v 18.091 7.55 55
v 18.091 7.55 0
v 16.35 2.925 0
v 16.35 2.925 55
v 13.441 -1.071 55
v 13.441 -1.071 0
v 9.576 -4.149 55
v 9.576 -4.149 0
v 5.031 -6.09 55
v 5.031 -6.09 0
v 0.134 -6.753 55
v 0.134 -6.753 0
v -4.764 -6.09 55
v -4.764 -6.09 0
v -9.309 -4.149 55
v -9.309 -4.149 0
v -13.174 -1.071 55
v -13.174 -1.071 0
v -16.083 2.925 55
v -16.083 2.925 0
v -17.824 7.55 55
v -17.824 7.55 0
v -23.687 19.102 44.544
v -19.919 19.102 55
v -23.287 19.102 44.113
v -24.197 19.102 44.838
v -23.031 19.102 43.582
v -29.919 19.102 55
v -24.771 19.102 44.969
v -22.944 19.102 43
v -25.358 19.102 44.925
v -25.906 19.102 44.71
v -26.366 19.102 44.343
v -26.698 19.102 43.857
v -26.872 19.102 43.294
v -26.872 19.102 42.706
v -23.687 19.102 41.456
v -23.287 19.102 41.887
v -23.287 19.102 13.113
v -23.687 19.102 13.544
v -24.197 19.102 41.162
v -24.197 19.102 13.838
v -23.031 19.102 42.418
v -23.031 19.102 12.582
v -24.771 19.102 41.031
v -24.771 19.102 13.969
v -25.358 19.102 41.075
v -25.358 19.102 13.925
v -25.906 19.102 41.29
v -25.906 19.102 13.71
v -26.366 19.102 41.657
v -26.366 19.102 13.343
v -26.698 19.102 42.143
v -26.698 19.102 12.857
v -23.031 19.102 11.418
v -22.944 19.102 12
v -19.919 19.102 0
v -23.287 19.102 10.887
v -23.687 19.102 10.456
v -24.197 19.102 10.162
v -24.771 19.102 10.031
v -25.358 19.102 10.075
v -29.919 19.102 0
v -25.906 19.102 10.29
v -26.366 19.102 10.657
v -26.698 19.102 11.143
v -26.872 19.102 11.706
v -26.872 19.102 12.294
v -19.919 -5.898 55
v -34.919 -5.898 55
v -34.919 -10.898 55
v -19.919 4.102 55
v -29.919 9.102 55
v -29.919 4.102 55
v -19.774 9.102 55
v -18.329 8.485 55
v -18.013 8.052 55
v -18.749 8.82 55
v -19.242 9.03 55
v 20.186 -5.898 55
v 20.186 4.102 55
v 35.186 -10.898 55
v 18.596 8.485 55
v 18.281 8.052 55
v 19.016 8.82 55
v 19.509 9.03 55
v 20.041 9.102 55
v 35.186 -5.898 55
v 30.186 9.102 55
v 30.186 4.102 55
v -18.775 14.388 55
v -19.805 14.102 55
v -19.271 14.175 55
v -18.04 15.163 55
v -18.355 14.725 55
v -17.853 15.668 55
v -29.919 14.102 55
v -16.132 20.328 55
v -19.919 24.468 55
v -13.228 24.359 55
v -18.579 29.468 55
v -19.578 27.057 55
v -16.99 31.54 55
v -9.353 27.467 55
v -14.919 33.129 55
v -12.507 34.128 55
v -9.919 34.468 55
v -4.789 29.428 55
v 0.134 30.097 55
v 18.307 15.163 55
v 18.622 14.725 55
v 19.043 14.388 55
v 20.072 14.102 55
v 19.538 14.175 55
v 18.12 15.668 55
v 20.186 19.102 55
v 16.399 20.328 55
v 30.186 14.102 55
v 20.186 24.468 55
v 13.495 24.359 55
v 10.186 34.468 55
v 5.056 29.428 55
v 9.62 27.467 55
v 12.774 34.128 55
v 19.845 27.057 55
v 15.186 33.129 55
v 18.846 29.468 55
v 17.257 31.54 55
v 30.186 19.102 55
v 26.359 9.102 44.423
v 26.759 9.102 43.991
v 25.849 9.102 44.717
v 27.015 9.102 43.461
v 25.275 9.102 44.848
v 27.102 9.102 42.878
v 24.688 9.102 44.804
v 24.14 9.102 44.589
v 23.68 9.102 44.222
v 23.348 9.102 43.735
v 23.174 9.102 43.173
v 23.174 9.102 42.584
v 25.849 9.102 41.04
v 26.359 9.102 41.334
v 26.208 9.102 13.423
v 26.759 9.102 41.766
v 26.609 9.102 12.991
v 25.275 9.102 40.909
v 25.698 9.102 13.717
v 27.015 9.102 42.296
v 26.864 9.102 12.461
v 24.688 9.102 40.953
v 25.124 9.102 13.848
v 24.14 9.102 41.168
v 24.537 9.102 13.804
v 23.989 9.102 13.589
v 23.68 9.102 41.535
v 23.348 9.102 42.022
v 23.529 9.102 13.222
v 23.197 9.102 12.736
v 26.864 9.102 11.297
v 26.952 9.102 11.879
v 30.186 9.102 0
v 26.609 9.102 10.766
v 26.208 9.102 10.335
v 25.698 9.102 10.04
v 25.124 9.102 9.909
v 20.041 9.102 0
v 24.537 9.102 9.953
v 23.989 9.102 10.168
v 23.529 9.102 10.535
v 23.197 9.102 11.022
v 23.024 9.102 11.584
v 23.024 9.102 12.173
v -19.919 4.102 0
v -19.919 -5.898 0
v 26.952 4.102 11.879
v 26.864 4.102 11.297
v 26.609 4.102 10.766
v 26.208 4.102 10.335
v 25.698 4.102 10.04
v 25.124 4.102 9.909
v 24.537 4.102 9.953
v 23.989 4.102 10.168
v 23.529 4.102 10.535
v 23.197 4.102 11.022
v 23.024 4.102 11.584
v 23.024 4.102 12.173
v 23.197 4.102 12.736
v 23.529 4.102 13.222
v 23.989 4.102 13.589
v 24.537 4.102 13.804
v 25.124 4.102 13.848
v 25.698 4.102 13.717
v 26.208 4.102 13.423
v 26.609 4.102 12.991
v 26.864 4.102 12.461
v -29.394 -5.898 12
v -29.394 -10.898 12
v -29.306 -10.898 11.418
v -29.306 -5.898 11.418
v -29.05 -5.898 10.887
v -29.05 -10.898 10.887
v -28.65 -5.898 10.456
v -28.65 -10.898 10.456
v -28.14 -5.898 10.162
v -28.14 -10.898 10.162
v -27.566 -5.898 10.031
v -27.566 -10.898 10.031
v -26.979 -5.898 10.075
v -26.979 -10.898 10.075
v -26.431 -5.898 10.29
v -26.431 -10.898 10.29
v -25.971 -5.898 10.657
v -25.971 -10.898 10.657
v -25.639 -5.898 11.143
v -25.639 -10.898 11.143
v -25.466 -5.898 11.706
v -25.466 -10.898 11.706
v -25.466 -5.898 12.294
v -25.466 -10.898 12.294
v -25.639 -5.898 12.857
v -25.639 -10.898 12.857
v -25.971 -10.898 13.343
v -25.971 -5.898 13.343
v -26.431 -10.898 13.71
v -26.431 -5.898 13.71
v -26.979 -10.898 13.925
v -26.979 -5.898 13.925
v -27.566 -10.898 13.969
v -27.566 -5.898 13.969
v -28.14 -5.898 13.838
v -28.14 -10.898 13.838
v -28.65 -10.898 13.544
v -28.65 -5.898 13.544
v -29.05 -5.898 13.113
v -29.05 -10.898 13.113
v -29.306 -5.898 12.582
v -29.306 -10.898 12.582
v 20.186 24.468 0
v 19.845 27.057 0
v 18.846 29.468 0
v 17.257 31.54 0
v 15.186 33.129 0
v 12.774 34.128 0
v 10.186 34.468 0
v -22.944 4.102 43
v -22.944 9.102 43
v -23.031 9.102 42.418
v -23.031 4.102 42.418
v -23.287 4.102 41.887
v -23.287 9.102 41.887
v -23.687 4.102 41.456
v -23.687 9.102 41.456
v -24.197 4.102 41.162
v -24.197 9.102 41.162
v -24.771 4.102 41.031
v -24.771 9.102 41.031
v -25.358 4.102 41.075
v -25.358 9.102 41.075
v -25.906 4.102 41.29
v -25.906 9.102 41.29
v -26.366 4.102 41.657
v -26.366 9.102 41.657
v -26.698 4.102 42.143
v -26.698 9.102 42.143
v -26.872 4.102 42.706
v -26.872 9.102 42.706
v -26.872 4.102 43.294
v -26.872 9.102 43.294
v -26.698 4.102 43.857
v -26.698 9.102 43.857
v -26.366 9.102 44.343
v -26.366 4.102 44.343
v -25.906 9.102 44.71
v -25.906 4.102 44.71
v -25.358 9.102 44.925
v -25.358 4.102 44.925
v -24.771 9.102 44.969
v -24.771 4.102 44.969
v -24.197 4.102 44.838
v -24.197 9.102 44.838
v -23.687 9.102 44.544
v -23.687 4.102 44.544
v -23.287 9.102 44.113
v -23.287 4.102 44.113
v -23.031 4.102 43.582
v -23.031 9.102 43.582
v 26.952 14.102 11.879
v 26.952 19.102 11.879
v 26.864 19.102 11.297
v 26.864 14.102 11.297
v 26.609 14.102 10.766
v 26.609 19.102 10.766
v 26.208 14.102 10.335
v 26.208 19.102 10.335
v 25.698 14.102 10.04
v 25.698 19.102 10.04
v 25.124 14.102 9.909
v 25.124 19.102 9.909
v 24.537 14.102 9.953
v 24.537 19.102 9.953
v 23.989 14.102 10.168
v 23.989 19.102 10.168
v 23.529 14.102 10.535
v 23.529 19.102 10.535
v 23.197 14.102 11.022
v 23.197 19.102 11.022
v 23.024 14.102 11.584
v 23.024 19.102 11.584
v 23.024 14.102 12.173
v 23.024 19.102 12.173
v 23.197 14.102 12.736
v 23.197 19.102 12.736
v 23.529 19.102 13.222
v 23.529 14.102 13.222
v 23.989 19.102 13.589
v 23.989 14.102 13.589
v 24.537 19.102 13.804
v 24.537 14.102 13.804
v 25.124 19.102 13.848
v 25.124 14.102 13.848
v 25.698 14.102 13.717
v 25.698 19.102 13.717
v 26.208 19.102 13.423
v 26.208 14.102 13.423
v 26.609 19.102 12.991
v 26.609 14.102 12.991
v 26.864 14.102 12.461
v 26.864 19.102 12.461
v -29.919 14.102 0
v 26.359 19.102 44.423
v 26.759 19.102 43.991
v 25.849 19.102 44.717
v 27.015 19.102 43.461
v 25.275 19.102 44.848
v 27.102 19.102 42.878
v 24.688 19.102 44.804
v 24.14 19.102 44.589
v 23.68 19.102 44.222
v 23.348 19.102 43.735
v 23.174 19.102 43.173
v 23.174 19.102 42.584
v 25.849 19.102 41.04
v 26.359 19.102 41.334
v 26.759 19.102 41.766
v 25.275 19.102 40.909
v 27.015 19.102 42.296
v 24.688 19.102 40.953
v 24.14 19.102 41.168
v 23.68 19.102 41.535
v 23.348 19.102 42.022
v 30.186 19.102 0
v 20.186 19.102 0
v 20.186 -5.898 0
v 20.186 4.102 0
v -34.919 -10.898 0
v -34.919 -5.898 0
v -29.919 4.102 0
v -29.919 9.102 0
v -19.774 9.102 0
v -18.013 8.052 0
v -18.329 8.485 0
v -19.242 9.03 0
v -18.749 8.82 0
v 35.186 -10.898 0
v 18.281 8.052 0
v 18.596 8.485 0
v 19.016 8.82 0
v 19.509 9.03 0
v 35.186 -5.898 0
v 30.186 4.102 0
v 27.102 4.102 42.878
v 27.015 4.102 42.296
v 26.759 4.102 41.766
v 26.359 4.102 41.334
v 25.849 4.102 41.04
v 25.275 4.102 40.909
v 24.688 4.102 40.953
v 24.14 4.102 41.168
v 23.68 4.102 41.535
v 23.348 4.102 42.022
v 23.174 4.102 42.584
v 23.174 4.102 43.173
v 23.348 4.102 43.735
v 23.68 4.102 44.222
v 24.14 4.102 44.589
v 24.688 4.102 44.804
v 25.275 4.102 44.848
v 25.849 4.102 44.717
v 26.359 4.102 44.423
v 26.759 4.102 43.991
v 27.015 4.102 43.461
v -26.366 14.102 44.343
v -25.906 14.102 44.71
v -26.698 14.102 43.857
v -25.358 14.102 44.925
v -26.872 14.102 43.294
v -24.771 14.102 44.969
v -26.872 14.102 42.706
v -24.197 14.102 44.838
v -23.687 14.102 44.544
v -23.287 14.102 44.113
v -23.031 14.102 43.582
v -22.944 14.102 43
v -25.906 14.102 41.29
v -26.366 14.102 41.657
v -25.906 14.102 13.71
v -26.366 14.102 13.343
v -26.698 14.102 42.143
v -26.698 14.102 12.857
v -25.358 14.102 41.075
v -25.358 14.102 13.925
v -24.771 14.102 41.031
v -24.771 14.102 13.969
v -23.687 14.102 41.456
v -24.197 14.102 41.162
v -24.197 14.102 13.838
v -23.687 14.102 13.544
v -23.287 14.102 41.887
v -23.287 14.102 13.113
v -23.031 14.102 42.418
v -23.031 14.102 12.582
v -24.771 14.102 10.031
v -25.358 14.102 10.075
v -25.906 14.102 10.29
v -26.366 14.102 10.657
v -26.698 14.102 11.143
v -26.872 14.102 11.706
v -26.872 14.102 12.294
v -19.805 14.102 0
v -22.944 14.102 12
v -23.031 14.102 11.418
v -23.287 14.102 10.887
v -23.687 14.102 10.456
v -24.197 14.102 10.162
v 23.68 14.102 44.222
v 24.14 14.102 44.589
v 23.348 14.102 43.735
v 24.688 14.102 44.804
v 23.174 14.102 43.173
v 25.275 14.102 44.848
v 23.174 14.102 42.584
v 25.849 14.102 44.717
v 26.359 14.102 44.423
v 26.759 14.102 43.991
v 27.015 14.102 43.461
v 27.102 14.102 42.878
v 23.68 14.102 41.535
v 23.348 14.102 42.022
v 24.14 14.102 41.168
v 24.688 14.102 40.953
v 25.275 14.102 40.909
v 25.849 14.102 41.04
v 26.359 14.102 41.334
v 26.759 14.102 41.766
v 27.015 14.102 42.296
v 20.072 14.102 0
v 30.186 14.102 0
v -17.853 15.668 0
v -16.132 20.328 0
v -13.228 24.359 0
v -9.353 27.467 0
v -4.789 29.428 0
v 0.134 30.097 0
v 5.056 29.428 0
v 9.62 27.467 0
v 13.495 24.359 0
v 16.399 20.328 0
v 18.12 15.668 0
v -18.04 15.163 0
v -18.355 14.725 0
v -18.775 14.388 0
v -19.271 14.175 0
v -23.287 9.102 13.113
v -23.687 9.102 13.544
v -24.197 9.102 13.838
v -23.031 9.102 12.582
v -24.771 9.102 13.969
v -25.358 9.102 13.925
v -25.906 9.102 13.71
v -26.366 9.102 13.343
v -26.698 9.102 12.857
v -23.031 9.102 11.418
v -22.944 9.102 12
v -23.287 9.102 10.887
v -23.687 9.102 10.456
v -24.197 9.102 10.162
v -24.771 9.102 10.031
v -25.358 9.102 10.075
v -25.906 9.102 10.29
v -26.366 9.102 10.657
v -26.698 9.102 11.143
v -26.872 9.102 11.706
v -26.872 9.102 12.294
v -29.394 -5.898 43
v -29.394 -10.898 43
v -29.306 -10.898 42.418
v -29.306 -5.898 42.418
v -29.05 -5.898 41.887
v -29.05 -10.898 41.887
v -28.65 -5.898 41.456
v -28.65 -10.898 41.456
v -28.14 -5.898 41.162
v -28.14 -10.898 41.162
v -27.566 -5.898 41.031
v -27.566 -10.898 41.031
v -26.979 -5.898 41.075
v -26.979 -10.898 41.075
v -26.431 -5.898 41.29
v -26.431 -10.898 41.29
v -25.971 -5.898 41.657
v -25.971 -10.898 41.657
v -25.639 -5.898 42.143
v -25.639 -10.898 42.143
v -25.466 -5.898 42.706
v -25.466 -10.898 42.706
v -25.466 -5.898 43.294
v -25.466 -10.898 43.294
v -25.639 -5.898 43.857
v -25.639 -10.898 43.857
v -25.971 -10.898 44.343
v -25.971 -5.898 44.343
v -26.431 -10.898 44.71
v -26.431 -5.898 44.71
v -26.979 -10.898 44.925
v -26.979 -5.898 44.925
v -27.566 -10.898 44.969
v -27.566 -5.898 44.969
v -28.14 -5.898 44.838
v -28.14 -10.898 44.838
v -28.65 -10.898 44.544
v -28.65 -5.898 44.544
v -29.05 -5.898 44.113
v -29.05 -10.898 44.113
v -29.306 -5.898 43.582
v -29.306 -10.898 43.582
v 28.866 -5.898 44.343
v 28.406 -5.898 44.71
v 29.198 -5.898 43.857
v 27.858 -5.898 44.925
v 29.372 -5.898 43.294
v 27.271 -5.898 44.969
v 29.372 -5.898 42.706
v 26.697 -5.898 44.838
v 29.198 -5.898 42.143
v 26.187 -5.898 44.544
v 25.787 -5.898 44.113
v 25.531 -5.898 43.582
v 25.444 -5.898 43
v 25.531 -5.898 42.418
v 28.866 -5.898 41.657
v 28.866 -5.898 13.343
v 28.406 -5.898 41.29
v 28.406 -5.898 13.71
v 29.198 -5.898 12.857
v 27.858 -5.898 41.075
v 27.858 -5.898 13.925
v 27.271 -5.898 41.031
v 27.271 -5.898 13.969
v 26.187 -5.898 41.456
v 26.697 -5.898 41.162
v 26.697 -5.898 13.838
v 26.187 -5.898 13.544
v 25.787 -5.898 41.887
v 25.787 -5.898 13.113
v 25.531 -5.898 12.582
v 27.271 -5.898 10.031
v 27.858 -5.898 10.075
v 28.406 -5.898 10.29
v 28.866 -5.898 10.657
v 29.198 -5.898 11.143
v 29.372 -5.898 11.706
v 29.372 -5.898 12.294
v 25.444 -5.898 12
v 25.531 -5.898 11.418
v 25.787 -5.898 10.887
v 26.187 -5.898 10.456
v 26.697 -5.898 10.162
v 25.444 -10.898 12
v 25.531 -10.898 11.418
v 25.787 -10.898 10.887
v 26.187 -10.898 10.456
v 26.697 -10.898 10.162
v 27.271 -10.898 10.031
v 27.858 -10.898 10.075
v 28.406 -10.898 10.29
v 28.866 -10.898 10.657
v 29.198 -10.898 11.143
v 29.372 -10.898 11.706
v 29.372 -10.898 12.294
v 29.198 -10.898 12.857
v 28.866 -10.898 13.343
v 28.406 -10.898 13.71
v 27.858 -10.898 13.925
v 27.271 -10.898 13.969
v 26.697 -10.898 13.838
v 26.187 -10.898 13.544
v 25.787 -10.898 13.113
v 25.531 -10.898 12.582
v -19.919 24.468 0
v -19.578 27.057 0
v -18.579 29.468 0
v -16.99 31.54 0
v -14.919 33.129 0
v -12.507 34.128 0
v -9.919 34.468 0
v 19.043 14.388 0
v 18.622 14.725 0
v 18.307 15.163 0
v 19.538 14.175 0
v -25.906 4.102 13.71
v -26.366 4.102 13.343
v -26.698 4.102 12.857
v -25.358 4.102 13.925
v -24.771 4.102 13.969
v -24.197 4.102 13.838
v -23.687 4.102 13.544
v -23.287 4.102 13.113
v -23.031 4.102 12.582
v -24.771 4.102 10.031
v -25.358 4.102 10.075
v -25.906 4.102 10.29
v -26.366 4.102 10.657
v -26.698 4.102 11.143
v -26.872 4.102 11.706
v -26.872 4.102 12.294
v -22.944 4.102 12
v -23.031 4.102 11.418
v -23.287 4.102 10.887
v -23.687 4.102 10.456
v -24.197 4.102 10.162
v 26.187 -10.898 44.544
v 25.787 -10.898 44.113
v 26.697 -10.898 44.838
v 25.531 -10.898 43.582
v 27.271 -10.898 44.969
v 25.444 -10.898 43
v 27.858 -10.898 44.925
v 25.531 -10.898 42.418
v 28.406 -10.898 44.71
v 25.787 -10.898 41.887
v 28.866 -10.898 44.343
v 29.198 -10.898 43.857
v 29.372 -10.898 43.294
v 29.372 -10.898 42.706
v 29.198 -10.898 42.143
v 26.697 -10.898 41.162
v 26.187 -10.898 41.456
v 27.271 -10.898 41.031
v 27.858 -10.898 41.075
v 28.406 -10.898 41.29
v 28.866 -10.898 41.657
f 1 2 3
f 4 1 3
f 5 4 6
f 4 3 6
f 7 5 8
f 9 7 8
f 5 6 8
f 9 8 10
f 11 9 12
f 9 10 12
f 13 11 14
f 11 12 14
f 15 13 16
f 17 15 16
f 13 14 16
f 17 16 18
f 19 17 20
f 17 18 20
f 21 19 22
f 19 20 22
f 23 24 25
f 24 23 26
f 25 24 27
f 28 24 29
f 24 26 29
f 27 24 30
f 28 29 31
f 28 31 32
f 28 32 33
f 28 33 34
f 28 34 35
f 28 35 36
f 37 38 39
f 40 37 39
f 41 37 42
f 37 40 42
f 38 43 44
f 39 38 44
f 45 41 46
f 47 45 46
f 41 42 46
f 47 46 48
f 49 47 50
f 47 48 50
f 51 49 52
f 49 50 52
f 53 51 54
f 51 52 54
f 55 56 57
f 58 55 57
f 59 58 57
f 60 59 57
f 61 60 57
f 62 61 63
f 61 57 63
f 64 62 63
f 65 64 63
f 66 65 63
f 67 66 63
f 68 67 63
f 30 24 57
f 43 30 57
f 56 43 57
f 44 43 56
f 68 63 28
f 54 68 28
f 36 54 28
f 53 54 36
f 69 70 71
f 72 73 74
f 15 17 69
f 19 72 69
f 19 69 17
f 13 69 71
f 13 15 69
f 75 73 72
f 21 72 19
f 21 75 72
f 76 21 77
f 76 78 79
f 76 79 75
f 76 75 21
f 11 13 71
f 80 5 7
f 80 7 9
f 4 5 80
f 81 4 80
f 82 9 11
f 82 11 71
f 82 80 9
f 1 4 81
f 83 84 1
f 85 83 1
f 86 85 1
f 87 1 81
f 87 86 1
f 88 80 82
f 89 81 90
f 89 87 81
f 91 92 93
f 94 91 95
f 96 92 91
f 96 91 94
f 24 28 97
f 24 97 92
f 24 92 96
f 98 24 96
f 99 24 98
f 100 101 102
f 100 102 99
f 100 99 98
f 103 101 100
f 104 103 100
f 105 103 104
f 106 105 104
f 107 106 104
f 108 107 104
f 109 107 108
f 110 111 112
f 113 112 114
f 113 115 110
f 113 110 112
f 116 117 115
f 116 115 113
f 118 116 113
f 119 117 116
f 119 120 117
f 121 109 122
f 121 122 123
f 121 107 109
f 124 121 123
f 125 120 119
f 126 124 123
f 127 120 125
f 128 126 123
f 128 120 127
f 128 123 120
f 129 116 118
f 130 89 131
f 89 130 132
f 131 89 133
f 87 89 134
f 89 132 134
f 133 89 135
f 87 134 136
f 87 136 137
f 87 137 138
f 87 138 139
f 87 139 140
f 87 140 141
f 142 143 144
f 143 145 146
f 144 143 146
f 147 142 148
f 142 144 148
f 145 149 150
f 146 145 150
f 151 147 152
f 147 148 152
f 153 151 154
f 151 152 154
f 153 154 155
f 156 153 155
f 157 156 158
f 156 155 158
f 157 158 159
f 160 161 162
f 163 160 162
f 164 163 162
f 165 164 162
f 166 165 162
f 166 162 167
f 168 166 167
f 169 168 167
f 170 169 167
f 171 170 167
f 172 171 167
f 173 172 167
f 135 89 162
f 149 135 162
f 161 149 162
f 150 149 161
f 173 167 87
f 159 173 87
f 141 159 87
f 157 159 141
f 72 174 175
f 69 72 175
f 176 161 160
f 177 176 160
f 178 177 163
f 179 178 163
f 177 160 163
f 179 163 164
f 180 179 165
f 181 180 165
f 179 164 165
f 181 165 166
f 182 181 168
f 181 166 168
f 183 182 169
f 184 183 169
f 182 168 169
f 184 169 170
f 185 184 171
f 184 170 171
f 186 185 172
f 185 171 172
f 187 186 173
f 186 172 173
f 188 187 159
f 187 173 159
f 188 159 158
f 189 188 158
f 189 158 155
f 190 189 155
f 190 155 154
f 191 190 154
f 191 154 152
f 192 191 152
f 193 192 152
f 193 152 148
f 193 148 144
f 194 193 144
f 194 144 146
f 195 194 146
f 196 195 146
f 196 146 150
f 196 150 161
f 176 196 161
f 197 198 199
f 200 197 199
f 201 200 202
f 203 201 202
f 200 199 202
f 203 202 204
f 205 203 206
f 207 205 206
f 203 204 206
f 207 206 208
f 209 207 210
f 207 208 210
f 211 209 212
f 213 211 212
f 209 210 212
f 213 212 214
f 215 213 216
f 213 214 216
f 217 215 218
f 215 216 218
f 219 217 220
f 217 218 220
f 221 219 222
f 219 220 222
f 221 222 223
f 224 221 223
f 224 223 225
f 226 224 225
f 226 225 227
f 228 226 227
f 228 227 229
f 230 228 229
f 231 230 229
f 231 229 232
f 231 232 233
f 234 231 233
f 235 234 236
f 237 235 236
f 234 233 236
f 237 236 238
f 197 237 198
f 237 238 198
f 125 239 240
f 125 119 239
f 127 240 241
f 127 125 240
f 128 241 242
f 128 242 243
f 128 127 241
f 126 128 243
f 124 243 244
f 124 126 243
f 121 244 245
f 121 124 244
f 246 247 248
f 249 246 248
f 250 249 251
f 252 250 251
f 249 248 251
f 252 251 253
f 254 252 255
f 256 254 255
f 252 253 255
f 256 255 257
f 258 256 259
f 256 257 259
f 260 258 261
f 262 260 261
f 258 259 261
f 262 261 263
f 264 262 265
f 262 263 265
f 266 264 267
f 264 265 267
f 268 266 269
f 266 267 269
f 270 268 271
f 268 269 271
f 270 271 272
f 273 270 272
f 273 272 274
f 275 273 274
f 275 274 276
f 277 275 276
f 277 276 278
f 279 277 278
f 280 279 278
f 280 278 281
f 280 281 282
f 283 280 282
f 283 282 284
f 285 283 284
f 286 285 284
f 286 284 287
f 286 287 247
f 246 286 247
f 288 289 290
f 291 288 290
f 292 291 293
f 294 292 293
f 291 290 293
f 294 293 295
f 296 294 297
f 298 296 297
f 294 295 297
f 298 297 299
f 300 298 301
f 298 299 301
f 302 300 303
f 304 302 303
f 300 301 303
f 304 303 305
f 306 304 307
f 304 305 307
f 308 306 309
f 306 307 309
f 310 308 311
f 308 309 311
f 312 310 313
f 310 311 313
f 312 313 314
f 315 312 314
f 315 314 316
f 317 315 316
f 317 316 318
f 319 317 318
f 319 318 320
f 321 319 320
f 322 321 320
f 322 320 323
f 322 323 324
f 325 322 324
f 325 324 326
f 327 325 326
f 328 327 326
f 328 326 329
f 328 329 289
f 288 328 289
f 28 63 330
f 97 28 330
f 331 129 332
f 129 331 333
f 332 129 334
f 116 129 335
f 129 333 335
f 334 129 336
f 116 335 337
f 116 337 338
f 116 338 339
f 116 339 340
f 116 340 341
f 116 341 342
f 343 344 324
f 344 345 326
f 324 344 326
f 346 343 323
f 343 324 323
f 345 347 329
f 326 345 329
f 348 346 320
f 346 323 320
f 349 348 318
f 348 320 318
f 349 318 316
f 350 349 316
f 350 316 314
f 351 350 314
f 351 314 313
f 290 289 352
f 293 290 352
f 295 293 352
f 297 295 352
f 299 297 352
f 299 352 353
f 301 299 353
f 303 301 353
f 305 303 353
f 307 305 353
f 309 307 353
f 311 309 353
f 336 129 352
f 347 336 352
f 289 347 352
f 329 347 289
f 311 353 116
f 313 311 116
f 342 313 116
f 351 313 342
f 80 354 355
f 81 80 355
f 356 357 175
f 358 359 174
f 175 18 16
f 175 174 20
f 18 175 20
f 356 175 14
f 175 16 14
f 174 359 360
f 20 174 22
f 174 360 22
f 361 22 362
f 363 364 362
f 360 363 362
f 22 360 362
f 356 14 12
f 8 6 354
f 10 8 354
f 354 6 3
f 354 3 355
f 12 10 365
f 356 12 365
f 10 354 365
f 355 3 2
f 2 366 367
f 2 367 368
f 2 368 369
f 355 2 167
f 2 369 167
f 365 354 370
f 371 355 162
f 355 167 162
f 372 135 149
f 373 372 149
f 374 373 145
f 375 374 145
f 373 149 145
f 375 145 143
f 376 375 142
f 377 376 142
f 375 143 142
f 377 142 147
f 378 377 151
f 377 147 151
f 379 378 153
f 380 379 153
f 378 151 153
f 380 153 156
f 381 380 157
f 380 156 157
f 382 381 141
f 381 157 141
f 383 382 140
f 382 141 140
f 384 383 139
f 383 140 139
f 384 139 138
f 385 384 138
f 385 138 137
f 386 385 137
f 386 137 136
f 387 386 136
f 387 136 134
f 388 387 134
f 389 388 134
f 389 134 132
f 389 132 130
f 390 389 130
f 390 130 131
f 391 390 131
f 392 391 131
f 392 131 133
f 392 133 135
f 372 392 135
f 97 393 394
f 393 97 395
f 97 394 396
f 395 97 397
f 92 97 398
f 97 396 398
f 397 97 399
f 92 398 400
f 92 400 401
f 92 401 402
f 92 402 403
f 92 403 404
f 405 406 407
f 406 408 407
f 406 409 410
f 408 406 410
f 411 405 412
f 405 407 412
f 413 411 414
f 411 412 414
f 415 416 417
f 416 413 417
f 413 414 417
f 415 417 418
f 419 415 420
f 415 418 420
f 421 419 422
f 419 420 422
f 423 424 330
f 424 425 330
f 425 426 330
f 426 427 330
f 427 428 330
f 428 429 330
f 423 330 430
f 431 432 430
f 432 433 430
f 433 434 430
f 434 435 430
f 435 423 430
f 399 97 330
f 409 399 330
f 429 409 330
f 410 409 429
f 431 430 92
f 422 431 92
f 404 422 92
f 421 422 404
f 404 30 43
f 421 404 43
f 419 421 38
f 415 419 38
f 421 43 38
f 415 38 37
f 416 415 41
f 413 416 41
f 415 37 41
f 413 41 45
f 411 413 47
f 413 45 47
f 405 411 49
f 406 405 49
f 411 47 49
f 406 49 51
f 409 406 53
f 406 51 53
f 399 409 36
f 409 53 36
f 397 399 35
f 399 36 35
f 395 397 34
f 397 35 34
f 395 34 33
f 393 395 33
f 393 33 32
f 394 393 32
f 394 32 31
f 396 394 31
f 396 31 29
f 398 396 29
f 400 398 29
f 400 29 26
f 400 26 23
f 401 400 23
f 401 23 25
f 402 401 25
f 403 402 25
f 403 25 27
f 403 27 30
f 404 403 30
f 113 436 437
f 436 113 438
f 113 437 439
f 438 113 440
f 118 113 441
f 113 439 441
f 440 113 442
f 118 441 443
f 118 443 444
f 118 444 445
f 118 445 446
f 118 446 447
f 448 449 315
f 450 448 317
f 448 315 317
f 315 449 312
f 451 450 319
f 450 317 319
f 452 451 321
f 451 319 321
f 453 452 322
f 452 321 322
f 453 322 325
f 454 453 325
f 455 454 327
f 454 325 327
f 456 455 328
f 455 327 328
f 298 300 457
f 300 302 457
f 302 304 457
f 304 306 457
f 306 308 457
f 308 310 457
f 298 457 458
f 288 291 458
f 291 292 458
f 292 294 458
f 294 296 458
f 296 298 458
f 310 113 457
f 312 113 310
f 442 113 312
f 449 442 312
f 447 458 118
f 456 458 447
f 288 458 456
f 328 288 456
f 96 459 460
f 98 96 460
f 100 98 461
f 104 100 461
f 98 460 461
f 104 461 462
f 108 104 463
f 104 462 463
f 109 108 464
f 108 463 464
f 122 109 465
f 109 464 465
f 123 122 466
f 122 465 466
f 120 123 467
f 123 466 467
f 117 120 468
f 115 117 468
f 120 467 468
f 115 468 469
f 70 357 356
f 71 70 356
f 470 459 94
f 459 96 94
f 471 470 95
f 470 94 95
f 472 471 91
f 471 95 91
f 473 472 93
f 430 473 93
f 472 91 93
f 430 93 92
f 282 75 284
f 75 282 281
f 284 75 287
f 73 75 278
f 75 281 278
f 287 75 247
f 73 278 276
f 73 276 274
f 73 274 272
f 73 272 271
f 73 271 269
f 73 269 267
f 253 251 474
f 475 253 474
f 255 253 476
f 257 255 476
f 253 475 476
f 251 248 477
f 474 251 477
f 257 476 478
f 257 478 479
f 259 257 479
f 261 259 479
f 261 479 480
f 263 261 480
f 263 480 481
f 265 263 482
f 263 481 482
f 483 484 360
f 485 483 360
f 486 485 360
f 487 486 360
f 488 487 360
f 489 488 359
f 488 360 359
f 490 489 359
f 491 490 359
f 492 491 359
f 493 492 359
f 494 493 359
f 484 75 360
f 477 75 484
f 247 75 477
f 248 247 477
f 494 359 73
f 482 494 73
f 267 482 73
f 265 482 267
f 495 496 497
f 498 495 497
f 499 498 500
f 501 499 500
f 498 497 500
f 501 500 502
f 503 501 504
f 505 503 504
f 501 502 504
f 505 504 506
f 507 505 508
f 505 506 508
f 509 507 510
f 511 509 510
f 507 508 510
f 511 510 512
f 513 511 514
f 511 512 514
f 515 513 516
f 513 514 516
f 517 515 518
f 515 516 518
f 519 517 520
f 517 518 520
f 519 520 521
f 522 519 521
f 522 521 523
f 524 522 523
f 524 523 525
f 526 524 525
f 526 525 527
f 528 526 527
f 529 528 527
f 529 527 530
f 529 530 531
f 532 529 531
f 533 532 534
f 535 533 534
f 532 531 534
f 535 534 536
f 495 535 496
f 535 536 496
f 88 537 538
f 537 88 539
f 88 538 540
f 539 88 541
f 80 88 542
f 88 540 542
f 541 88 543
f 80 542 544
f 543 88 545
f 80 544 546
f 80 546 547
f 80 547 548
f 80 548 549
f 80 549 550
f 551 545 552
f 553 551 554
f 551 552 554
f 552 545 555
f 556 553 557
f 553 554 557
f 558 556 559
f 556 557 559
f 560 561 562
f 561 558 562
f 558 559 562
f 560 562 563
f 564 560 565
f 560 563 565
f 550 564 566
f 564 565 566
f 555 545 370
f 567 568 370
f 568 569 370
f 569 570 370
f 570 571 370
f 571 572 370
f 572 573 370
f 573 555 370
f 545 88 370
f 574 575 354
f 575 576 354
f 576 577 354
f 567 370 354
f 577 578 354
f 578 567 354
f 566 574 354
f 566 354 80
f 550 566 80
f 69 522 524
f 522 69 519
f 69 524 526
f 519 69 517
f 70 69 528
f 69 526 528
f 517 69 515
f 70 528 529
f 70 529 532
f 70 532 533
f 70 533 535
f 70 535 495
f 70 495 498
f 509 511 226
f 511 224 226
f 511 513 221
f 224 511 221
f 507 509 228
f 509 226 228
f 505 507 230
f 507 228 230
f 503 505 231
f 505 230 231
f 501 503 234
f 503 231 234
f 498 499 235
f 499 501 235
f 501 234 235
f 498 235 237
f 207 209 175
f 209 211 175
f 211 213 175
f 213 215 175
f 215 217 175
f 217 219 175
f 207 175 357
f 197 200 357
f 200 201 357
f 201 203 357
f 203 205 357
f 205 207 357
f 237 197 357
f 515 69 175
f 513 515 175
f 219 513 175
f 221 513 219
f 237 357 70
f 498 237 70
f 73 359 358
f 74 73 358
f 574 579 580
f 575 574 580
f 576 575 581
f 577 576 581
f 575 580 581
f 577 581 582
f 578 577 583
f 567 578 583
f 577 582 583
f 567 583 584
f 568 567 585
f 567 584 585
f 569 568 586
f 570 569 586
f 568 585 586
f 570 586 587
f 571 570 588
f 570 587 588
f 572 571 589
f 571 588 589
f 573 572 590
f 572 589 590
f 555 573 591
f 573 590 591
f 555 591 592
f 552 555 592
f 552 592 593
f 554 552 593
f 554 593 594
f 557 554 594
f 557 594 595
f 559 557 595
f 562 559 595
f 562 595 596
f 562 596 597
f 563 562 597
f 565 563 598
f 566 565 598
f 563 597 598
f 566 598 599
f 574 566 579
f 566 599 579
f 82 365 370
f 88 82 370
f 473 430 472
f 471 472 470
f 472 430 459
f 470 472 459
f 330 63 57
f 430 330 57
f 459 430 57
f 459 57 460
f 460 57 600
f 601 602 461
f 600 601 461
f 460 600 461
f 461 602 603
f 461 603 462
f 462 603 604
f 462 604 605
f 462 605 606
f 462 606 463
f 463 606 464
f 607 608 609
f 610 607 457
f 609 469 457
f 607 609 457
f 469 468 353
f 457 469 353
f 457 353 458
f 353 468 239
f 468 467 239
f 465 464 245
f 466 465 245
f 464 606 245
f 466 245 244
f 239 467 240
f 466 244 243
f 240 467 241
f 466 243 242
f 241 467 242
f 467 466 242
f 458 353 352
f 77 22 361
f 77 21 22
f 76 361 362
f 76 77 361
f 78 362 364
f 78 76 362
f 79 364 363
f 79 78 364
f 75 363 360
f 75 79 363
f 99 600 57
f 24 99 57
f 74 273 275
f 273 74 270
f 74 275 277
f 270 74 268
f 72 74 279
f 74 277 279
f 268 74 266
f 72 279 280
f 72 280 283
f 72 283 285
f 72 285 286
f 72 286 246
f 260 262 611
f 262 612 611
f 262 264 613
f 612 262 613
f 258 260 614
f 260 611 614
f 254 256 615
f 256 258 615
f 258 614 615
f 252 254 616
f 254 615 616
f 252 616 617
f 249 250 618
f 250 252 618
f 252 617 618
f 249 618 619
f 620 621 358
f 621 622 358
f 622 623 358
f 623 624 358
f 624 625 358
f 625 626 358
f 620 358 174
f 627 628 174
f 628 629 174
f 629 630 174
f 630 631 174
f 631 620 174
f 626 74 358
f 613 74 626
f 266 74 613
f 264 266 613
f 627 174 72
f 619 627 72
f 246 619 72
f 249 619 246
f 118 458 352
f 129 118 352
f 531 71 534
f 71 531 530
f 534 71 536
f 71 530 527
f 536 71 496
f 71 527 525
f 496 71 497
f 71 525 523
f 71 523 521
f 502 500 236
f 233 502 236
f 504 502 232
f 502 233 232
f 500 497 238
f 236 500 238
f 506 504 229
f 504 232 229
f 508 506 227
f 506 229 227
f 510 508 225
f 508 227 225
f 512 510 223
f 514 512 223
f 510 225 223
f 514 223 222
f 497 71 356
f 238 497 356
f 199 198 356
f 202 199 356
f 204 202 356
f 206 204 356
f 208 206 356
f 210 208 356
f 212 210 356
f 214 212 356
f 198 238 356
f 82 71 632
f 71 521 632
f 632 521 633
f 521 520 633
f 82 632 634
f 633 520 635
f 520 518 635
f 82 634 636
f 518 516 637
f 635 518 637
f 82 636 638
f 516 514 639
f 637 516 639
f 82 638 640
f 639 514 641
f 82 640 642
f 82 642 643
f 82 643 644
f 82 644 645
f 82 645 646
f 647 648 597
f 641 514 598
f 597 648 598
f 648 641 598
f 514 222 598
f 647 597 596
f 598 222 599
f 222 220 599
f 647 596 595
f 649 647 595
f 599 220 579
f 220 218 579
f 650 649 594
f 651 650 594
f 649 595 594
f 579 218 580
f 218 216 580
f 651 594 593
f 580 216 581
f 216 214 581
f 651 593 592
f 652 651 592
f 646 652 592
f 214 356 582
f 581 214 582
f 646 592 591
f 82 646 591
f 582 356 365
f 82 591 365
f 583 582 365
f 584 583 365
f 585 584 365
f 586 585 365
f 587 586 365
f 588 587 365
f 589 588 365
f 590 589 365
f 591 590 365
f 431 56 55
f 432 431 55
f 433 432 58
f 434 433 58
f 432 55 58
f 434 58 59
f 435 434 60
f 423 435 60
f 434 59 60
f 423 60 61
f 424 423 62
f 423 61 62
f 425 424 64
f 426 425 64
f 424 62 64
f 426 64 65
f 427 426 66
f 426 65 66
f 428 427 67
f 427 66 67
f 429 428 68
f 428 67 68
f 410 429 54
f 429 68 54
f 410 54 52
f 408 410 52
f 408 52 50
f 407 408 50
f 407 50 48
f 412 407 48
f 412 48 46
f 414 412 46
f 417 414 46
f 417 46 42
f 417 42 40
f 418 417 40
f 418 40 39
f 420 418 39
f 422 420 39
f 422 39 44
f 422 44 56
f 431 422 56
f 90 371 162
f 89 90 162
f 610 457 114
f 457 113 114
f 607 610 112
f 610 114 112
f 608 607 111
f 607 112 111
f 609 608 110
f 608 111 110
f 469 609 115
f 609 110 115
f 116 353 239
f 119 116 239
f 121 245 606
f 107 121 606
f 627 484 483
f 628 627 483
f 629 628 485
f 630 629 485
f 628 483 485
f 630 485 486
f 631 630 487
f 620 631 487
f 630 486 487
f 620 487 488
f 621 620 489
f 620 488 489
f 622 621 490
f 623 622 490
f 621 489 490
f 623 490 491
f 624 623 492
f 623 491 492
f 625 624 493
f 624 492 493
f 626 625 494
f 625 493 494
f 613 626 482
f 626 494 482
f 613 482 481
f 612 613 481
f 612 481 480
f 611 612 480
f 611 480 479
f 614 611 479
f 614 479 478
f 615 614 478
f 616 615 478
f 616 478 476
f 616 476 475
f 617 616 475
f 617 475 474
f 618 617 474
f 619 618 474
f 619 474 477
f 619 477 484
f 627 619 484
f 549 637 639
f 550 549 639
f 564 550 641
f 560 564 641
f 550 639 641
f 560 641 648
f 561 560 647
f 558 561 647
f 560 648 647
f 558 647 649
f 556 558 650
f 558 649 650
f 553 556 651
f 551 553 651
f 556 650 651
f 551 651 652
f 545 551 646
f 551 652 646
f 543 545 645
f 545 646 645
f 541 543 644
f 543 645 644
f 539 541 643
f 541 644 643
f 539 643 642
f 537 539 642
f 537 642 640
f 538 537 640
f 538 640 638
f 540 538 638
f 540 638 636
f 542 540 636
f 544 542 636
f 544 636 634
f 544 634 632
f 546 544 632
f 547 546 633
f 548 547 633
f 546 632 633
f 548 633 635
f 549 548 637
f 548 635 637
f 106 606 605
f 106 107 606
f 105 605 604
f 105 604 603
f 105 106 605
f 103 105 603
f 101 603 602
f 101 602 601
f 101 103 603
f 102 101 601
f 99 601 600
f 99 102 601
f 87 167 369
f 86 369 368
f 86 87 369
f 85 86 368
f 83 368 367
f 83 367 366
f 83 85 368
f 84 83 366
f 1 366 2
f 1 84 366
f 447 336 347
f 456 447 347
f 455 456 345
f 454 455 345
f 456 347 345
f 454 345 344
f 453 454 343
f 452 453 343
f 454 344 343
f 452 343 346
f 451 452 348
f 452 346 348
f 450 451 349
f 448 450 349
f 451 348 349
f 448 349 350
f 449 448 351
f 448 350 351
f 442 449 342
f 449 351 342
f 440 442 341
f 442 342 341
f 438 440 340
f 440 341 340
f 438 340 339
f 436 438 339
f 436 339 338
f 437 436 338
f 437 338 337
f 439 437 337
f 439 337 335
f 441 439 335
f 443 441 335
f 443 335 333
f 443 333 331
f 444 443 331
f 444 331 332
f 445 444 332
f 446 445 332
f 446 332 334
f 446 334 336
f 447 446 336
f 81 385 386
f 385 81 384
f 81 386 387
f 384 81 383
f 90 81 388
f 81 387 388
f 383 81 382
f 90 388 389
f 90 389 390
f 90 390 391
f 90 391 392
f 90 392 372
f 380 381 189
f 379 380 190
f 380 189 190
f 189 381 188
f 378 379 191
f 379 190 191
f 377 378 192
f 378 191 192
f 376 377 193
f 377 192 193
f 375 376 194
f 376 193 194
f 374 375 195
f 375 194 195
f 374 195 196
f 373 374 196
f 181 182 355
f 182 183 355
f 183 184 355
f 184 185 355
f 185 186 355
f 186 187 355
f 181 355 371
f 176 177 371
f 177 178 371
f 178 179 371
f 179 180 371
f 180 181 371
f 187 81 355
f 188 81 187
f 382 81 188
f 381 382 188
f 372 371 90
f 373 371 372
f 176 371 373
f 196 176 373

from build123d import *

# Parameters (mm, degrees)
BOSS_EXTRUDE1_DEPTH   = 55
BOSS_EXTRUDE1_2_DEPTH = 55
FILLET1_R             = 10
FILLET2_R             = 2
FILLET3_R             = 2
SKETCH3_R             = 1.975
CUT_EXTRUDE1_DEPTH    = 15
SKETCH5_R             = 1.975
CUT_EXTRUDE2_DEPTH    = 5


with BuildPart() as part:
    # Sketch1 → Boss-Extrude1 (new body)
    with BuildSketch(Plane.XY):
        with BuildLine():
            Line((-34.918673845, -5.897830648), (-34.918673845, -10.897830648))
            Line((-34.918673845, -10.897830648), (35.185897583, -10.897830648))
            Line((35.185897583, -10.897830648), (35.185897583, -5.897830648))
            Line((35.185897583, -5.897830648), (20.185897583, -5.897830648))
            Line((20.185897583, -5.897830648), (20.185897583, 4.102169352))
            Line((20.185897583, 4.102169352), (30.185897583, 4.102169352))
            Line((30.185897583, 4.102169352), (30.185897583, 9.102169352))
            Line((30.185897583, 9.102169352), (18.378479649, 9.102169352))
            ThreePointArc((18.378479649, 9.102169352), (0.133611869, -6.752728571), (-18.111255911, 9.102169352))
            Line((-18.111255911, 9.102169352), (-29.918673845, 9.102169352))
            Line((-29.918673845, 9.102169352), (-29.918673845, 4.102169352))
            Line((-29.918673845, 4.102169352), (-19.918673845, 4.102169352))
            Line((-19.918673845, 4.102169352), (-19.918673845, -5.897830648))
            Line((-19.918673845, -5.897830648), (-34.918673845, -5.897830648))
        make_face()
    extrude(amount=BOSS_EXTRUDE1_DEPTH)

    # Fillet2
    fillet2_edges = [part.edges().sort_by_distance(p)[0] for p in [
        (18.378479649, 9.102169352, 27.5),
        (-18.111255911, 9.102169352, 27.5),
    ]]
    fillet(fillet2_edges, radius=FILLET2_R)


with BuildPart() as body_2:
    # Sketch1 → Boss-Extrude1 2 (new body)
    with BuildSketch(Plane.XY):
        with BuildLine():
            Line((-29.918673845, 14.102169352), (-18.130457258, 14.102169352))
            ThreePointArc((-18.130457258, 14.102169352), (0.133611869, 30.097271429), (18.397680996, 14.102169352))
            Line((18.397680996, 14.102169352), (30.185897583, 14.102169352))
            Line((30.185897583, 14.102169352), (30.185897583, 19.102169352))
            Line((30.185897583, 19.102169352), (20.185897583, 19.102169352))
            Line((20.185897583, 19.102169352), (20.185897583, 34.468440781))
            Line((20.185897583, 34.468440781), (-19.918673845, 34.468440781))
            Line((-19.918673845, 34.468440781), (-19.918673845, 19.102169352))
            Line((-19.918673845, 19.102169352), (-29.918673845, 19.102169352))
            Line((-29.918673845, 19.102169352), (-29.918673845, 14.102169352))
        make_face()
    extrude(amount=BOSS_EXTRUDE1_2_DEPTH)

    # Fillet1
    fillet1_edges = [body_2.edges().sort_by_distance(p)[0] for p in [
        (-19.918673845, 34.468440781, 27.5),
        (20.185897583, 34.468440781, 27.5),
    ]]
    fillet(fillet1_edges, radius=FILLET1_R)

    # Fillet3
    fillet3_edges = [body_2.edges().sort_by_distance(p)[0] for p in [
        (-18.130457258, 14.102169352, 27.5),
        (18.397680996, 14.102169352, 27.5),
    ]]
    fillet(fillet3_edges, radius=FILLET3_R)


with BuildPart() as cut_extrude1_tool:
    # Sketch3 → Cut-Extrude1 (new body)
    with BuildSketch(Plane(origin=(0, 19.102169352, 0), x_dir=(1, 0, 0), z_dir=(0, 1, 0))):
        with Locations((-24.918673845, -12)):
            Circle(SKETCH3_R)
        with Locations((-24.918673845, -43)):
            Circle(SKETCH3_R)
        with Locations((25.127298875, -42.878422983)):
            Circle(SKETCH3_R)
        with Locations((24.976682747, -11.878788875)):
            Circle(SKETCH3_R)
    extrude(amount=-CUT_EXTRUDE1_DEPTH)


with BuildPart() as part_1:
    add(part.part)

    # Cut-Extrude1: cut by cut_extrude1_tool
    add(cut_extrude1_tool.part, mode=Mode.SUBTRACT)

    # Sketch5 → Cut-Extrude2 (cut)
    with BuildSketch(Plane(origin=(0, -10.897830648, 0), x_dir=(-1, 0, 0), z_dir=(0, -1, 0))):
        with Locations((27.418673845, -43)):
            Circle(SKETCH5_R)
        with Locations((27.418673845, -12)):
            Circle(SKETCH5_R)
        with Locations((-27.418673845, -12)):
            Circle(SKETCH5_R)
        with Locations((-27.418673845, -43)):
            Circle(SKETCH5_R)
    extrude(amount=-CUT_EXTRUDE2_DEPTH, mode=Mode.SUBTRACT)


with BuildPart() as body_2_1:
    add(body_2.part)

    # Cut-Extrude1: cut by cut_extrude1_tool
    add(cut_extrude1_tool.part, mode=Mode.SUBTRACT)


solid = Compound([part_1.part, body_2_1.part])
